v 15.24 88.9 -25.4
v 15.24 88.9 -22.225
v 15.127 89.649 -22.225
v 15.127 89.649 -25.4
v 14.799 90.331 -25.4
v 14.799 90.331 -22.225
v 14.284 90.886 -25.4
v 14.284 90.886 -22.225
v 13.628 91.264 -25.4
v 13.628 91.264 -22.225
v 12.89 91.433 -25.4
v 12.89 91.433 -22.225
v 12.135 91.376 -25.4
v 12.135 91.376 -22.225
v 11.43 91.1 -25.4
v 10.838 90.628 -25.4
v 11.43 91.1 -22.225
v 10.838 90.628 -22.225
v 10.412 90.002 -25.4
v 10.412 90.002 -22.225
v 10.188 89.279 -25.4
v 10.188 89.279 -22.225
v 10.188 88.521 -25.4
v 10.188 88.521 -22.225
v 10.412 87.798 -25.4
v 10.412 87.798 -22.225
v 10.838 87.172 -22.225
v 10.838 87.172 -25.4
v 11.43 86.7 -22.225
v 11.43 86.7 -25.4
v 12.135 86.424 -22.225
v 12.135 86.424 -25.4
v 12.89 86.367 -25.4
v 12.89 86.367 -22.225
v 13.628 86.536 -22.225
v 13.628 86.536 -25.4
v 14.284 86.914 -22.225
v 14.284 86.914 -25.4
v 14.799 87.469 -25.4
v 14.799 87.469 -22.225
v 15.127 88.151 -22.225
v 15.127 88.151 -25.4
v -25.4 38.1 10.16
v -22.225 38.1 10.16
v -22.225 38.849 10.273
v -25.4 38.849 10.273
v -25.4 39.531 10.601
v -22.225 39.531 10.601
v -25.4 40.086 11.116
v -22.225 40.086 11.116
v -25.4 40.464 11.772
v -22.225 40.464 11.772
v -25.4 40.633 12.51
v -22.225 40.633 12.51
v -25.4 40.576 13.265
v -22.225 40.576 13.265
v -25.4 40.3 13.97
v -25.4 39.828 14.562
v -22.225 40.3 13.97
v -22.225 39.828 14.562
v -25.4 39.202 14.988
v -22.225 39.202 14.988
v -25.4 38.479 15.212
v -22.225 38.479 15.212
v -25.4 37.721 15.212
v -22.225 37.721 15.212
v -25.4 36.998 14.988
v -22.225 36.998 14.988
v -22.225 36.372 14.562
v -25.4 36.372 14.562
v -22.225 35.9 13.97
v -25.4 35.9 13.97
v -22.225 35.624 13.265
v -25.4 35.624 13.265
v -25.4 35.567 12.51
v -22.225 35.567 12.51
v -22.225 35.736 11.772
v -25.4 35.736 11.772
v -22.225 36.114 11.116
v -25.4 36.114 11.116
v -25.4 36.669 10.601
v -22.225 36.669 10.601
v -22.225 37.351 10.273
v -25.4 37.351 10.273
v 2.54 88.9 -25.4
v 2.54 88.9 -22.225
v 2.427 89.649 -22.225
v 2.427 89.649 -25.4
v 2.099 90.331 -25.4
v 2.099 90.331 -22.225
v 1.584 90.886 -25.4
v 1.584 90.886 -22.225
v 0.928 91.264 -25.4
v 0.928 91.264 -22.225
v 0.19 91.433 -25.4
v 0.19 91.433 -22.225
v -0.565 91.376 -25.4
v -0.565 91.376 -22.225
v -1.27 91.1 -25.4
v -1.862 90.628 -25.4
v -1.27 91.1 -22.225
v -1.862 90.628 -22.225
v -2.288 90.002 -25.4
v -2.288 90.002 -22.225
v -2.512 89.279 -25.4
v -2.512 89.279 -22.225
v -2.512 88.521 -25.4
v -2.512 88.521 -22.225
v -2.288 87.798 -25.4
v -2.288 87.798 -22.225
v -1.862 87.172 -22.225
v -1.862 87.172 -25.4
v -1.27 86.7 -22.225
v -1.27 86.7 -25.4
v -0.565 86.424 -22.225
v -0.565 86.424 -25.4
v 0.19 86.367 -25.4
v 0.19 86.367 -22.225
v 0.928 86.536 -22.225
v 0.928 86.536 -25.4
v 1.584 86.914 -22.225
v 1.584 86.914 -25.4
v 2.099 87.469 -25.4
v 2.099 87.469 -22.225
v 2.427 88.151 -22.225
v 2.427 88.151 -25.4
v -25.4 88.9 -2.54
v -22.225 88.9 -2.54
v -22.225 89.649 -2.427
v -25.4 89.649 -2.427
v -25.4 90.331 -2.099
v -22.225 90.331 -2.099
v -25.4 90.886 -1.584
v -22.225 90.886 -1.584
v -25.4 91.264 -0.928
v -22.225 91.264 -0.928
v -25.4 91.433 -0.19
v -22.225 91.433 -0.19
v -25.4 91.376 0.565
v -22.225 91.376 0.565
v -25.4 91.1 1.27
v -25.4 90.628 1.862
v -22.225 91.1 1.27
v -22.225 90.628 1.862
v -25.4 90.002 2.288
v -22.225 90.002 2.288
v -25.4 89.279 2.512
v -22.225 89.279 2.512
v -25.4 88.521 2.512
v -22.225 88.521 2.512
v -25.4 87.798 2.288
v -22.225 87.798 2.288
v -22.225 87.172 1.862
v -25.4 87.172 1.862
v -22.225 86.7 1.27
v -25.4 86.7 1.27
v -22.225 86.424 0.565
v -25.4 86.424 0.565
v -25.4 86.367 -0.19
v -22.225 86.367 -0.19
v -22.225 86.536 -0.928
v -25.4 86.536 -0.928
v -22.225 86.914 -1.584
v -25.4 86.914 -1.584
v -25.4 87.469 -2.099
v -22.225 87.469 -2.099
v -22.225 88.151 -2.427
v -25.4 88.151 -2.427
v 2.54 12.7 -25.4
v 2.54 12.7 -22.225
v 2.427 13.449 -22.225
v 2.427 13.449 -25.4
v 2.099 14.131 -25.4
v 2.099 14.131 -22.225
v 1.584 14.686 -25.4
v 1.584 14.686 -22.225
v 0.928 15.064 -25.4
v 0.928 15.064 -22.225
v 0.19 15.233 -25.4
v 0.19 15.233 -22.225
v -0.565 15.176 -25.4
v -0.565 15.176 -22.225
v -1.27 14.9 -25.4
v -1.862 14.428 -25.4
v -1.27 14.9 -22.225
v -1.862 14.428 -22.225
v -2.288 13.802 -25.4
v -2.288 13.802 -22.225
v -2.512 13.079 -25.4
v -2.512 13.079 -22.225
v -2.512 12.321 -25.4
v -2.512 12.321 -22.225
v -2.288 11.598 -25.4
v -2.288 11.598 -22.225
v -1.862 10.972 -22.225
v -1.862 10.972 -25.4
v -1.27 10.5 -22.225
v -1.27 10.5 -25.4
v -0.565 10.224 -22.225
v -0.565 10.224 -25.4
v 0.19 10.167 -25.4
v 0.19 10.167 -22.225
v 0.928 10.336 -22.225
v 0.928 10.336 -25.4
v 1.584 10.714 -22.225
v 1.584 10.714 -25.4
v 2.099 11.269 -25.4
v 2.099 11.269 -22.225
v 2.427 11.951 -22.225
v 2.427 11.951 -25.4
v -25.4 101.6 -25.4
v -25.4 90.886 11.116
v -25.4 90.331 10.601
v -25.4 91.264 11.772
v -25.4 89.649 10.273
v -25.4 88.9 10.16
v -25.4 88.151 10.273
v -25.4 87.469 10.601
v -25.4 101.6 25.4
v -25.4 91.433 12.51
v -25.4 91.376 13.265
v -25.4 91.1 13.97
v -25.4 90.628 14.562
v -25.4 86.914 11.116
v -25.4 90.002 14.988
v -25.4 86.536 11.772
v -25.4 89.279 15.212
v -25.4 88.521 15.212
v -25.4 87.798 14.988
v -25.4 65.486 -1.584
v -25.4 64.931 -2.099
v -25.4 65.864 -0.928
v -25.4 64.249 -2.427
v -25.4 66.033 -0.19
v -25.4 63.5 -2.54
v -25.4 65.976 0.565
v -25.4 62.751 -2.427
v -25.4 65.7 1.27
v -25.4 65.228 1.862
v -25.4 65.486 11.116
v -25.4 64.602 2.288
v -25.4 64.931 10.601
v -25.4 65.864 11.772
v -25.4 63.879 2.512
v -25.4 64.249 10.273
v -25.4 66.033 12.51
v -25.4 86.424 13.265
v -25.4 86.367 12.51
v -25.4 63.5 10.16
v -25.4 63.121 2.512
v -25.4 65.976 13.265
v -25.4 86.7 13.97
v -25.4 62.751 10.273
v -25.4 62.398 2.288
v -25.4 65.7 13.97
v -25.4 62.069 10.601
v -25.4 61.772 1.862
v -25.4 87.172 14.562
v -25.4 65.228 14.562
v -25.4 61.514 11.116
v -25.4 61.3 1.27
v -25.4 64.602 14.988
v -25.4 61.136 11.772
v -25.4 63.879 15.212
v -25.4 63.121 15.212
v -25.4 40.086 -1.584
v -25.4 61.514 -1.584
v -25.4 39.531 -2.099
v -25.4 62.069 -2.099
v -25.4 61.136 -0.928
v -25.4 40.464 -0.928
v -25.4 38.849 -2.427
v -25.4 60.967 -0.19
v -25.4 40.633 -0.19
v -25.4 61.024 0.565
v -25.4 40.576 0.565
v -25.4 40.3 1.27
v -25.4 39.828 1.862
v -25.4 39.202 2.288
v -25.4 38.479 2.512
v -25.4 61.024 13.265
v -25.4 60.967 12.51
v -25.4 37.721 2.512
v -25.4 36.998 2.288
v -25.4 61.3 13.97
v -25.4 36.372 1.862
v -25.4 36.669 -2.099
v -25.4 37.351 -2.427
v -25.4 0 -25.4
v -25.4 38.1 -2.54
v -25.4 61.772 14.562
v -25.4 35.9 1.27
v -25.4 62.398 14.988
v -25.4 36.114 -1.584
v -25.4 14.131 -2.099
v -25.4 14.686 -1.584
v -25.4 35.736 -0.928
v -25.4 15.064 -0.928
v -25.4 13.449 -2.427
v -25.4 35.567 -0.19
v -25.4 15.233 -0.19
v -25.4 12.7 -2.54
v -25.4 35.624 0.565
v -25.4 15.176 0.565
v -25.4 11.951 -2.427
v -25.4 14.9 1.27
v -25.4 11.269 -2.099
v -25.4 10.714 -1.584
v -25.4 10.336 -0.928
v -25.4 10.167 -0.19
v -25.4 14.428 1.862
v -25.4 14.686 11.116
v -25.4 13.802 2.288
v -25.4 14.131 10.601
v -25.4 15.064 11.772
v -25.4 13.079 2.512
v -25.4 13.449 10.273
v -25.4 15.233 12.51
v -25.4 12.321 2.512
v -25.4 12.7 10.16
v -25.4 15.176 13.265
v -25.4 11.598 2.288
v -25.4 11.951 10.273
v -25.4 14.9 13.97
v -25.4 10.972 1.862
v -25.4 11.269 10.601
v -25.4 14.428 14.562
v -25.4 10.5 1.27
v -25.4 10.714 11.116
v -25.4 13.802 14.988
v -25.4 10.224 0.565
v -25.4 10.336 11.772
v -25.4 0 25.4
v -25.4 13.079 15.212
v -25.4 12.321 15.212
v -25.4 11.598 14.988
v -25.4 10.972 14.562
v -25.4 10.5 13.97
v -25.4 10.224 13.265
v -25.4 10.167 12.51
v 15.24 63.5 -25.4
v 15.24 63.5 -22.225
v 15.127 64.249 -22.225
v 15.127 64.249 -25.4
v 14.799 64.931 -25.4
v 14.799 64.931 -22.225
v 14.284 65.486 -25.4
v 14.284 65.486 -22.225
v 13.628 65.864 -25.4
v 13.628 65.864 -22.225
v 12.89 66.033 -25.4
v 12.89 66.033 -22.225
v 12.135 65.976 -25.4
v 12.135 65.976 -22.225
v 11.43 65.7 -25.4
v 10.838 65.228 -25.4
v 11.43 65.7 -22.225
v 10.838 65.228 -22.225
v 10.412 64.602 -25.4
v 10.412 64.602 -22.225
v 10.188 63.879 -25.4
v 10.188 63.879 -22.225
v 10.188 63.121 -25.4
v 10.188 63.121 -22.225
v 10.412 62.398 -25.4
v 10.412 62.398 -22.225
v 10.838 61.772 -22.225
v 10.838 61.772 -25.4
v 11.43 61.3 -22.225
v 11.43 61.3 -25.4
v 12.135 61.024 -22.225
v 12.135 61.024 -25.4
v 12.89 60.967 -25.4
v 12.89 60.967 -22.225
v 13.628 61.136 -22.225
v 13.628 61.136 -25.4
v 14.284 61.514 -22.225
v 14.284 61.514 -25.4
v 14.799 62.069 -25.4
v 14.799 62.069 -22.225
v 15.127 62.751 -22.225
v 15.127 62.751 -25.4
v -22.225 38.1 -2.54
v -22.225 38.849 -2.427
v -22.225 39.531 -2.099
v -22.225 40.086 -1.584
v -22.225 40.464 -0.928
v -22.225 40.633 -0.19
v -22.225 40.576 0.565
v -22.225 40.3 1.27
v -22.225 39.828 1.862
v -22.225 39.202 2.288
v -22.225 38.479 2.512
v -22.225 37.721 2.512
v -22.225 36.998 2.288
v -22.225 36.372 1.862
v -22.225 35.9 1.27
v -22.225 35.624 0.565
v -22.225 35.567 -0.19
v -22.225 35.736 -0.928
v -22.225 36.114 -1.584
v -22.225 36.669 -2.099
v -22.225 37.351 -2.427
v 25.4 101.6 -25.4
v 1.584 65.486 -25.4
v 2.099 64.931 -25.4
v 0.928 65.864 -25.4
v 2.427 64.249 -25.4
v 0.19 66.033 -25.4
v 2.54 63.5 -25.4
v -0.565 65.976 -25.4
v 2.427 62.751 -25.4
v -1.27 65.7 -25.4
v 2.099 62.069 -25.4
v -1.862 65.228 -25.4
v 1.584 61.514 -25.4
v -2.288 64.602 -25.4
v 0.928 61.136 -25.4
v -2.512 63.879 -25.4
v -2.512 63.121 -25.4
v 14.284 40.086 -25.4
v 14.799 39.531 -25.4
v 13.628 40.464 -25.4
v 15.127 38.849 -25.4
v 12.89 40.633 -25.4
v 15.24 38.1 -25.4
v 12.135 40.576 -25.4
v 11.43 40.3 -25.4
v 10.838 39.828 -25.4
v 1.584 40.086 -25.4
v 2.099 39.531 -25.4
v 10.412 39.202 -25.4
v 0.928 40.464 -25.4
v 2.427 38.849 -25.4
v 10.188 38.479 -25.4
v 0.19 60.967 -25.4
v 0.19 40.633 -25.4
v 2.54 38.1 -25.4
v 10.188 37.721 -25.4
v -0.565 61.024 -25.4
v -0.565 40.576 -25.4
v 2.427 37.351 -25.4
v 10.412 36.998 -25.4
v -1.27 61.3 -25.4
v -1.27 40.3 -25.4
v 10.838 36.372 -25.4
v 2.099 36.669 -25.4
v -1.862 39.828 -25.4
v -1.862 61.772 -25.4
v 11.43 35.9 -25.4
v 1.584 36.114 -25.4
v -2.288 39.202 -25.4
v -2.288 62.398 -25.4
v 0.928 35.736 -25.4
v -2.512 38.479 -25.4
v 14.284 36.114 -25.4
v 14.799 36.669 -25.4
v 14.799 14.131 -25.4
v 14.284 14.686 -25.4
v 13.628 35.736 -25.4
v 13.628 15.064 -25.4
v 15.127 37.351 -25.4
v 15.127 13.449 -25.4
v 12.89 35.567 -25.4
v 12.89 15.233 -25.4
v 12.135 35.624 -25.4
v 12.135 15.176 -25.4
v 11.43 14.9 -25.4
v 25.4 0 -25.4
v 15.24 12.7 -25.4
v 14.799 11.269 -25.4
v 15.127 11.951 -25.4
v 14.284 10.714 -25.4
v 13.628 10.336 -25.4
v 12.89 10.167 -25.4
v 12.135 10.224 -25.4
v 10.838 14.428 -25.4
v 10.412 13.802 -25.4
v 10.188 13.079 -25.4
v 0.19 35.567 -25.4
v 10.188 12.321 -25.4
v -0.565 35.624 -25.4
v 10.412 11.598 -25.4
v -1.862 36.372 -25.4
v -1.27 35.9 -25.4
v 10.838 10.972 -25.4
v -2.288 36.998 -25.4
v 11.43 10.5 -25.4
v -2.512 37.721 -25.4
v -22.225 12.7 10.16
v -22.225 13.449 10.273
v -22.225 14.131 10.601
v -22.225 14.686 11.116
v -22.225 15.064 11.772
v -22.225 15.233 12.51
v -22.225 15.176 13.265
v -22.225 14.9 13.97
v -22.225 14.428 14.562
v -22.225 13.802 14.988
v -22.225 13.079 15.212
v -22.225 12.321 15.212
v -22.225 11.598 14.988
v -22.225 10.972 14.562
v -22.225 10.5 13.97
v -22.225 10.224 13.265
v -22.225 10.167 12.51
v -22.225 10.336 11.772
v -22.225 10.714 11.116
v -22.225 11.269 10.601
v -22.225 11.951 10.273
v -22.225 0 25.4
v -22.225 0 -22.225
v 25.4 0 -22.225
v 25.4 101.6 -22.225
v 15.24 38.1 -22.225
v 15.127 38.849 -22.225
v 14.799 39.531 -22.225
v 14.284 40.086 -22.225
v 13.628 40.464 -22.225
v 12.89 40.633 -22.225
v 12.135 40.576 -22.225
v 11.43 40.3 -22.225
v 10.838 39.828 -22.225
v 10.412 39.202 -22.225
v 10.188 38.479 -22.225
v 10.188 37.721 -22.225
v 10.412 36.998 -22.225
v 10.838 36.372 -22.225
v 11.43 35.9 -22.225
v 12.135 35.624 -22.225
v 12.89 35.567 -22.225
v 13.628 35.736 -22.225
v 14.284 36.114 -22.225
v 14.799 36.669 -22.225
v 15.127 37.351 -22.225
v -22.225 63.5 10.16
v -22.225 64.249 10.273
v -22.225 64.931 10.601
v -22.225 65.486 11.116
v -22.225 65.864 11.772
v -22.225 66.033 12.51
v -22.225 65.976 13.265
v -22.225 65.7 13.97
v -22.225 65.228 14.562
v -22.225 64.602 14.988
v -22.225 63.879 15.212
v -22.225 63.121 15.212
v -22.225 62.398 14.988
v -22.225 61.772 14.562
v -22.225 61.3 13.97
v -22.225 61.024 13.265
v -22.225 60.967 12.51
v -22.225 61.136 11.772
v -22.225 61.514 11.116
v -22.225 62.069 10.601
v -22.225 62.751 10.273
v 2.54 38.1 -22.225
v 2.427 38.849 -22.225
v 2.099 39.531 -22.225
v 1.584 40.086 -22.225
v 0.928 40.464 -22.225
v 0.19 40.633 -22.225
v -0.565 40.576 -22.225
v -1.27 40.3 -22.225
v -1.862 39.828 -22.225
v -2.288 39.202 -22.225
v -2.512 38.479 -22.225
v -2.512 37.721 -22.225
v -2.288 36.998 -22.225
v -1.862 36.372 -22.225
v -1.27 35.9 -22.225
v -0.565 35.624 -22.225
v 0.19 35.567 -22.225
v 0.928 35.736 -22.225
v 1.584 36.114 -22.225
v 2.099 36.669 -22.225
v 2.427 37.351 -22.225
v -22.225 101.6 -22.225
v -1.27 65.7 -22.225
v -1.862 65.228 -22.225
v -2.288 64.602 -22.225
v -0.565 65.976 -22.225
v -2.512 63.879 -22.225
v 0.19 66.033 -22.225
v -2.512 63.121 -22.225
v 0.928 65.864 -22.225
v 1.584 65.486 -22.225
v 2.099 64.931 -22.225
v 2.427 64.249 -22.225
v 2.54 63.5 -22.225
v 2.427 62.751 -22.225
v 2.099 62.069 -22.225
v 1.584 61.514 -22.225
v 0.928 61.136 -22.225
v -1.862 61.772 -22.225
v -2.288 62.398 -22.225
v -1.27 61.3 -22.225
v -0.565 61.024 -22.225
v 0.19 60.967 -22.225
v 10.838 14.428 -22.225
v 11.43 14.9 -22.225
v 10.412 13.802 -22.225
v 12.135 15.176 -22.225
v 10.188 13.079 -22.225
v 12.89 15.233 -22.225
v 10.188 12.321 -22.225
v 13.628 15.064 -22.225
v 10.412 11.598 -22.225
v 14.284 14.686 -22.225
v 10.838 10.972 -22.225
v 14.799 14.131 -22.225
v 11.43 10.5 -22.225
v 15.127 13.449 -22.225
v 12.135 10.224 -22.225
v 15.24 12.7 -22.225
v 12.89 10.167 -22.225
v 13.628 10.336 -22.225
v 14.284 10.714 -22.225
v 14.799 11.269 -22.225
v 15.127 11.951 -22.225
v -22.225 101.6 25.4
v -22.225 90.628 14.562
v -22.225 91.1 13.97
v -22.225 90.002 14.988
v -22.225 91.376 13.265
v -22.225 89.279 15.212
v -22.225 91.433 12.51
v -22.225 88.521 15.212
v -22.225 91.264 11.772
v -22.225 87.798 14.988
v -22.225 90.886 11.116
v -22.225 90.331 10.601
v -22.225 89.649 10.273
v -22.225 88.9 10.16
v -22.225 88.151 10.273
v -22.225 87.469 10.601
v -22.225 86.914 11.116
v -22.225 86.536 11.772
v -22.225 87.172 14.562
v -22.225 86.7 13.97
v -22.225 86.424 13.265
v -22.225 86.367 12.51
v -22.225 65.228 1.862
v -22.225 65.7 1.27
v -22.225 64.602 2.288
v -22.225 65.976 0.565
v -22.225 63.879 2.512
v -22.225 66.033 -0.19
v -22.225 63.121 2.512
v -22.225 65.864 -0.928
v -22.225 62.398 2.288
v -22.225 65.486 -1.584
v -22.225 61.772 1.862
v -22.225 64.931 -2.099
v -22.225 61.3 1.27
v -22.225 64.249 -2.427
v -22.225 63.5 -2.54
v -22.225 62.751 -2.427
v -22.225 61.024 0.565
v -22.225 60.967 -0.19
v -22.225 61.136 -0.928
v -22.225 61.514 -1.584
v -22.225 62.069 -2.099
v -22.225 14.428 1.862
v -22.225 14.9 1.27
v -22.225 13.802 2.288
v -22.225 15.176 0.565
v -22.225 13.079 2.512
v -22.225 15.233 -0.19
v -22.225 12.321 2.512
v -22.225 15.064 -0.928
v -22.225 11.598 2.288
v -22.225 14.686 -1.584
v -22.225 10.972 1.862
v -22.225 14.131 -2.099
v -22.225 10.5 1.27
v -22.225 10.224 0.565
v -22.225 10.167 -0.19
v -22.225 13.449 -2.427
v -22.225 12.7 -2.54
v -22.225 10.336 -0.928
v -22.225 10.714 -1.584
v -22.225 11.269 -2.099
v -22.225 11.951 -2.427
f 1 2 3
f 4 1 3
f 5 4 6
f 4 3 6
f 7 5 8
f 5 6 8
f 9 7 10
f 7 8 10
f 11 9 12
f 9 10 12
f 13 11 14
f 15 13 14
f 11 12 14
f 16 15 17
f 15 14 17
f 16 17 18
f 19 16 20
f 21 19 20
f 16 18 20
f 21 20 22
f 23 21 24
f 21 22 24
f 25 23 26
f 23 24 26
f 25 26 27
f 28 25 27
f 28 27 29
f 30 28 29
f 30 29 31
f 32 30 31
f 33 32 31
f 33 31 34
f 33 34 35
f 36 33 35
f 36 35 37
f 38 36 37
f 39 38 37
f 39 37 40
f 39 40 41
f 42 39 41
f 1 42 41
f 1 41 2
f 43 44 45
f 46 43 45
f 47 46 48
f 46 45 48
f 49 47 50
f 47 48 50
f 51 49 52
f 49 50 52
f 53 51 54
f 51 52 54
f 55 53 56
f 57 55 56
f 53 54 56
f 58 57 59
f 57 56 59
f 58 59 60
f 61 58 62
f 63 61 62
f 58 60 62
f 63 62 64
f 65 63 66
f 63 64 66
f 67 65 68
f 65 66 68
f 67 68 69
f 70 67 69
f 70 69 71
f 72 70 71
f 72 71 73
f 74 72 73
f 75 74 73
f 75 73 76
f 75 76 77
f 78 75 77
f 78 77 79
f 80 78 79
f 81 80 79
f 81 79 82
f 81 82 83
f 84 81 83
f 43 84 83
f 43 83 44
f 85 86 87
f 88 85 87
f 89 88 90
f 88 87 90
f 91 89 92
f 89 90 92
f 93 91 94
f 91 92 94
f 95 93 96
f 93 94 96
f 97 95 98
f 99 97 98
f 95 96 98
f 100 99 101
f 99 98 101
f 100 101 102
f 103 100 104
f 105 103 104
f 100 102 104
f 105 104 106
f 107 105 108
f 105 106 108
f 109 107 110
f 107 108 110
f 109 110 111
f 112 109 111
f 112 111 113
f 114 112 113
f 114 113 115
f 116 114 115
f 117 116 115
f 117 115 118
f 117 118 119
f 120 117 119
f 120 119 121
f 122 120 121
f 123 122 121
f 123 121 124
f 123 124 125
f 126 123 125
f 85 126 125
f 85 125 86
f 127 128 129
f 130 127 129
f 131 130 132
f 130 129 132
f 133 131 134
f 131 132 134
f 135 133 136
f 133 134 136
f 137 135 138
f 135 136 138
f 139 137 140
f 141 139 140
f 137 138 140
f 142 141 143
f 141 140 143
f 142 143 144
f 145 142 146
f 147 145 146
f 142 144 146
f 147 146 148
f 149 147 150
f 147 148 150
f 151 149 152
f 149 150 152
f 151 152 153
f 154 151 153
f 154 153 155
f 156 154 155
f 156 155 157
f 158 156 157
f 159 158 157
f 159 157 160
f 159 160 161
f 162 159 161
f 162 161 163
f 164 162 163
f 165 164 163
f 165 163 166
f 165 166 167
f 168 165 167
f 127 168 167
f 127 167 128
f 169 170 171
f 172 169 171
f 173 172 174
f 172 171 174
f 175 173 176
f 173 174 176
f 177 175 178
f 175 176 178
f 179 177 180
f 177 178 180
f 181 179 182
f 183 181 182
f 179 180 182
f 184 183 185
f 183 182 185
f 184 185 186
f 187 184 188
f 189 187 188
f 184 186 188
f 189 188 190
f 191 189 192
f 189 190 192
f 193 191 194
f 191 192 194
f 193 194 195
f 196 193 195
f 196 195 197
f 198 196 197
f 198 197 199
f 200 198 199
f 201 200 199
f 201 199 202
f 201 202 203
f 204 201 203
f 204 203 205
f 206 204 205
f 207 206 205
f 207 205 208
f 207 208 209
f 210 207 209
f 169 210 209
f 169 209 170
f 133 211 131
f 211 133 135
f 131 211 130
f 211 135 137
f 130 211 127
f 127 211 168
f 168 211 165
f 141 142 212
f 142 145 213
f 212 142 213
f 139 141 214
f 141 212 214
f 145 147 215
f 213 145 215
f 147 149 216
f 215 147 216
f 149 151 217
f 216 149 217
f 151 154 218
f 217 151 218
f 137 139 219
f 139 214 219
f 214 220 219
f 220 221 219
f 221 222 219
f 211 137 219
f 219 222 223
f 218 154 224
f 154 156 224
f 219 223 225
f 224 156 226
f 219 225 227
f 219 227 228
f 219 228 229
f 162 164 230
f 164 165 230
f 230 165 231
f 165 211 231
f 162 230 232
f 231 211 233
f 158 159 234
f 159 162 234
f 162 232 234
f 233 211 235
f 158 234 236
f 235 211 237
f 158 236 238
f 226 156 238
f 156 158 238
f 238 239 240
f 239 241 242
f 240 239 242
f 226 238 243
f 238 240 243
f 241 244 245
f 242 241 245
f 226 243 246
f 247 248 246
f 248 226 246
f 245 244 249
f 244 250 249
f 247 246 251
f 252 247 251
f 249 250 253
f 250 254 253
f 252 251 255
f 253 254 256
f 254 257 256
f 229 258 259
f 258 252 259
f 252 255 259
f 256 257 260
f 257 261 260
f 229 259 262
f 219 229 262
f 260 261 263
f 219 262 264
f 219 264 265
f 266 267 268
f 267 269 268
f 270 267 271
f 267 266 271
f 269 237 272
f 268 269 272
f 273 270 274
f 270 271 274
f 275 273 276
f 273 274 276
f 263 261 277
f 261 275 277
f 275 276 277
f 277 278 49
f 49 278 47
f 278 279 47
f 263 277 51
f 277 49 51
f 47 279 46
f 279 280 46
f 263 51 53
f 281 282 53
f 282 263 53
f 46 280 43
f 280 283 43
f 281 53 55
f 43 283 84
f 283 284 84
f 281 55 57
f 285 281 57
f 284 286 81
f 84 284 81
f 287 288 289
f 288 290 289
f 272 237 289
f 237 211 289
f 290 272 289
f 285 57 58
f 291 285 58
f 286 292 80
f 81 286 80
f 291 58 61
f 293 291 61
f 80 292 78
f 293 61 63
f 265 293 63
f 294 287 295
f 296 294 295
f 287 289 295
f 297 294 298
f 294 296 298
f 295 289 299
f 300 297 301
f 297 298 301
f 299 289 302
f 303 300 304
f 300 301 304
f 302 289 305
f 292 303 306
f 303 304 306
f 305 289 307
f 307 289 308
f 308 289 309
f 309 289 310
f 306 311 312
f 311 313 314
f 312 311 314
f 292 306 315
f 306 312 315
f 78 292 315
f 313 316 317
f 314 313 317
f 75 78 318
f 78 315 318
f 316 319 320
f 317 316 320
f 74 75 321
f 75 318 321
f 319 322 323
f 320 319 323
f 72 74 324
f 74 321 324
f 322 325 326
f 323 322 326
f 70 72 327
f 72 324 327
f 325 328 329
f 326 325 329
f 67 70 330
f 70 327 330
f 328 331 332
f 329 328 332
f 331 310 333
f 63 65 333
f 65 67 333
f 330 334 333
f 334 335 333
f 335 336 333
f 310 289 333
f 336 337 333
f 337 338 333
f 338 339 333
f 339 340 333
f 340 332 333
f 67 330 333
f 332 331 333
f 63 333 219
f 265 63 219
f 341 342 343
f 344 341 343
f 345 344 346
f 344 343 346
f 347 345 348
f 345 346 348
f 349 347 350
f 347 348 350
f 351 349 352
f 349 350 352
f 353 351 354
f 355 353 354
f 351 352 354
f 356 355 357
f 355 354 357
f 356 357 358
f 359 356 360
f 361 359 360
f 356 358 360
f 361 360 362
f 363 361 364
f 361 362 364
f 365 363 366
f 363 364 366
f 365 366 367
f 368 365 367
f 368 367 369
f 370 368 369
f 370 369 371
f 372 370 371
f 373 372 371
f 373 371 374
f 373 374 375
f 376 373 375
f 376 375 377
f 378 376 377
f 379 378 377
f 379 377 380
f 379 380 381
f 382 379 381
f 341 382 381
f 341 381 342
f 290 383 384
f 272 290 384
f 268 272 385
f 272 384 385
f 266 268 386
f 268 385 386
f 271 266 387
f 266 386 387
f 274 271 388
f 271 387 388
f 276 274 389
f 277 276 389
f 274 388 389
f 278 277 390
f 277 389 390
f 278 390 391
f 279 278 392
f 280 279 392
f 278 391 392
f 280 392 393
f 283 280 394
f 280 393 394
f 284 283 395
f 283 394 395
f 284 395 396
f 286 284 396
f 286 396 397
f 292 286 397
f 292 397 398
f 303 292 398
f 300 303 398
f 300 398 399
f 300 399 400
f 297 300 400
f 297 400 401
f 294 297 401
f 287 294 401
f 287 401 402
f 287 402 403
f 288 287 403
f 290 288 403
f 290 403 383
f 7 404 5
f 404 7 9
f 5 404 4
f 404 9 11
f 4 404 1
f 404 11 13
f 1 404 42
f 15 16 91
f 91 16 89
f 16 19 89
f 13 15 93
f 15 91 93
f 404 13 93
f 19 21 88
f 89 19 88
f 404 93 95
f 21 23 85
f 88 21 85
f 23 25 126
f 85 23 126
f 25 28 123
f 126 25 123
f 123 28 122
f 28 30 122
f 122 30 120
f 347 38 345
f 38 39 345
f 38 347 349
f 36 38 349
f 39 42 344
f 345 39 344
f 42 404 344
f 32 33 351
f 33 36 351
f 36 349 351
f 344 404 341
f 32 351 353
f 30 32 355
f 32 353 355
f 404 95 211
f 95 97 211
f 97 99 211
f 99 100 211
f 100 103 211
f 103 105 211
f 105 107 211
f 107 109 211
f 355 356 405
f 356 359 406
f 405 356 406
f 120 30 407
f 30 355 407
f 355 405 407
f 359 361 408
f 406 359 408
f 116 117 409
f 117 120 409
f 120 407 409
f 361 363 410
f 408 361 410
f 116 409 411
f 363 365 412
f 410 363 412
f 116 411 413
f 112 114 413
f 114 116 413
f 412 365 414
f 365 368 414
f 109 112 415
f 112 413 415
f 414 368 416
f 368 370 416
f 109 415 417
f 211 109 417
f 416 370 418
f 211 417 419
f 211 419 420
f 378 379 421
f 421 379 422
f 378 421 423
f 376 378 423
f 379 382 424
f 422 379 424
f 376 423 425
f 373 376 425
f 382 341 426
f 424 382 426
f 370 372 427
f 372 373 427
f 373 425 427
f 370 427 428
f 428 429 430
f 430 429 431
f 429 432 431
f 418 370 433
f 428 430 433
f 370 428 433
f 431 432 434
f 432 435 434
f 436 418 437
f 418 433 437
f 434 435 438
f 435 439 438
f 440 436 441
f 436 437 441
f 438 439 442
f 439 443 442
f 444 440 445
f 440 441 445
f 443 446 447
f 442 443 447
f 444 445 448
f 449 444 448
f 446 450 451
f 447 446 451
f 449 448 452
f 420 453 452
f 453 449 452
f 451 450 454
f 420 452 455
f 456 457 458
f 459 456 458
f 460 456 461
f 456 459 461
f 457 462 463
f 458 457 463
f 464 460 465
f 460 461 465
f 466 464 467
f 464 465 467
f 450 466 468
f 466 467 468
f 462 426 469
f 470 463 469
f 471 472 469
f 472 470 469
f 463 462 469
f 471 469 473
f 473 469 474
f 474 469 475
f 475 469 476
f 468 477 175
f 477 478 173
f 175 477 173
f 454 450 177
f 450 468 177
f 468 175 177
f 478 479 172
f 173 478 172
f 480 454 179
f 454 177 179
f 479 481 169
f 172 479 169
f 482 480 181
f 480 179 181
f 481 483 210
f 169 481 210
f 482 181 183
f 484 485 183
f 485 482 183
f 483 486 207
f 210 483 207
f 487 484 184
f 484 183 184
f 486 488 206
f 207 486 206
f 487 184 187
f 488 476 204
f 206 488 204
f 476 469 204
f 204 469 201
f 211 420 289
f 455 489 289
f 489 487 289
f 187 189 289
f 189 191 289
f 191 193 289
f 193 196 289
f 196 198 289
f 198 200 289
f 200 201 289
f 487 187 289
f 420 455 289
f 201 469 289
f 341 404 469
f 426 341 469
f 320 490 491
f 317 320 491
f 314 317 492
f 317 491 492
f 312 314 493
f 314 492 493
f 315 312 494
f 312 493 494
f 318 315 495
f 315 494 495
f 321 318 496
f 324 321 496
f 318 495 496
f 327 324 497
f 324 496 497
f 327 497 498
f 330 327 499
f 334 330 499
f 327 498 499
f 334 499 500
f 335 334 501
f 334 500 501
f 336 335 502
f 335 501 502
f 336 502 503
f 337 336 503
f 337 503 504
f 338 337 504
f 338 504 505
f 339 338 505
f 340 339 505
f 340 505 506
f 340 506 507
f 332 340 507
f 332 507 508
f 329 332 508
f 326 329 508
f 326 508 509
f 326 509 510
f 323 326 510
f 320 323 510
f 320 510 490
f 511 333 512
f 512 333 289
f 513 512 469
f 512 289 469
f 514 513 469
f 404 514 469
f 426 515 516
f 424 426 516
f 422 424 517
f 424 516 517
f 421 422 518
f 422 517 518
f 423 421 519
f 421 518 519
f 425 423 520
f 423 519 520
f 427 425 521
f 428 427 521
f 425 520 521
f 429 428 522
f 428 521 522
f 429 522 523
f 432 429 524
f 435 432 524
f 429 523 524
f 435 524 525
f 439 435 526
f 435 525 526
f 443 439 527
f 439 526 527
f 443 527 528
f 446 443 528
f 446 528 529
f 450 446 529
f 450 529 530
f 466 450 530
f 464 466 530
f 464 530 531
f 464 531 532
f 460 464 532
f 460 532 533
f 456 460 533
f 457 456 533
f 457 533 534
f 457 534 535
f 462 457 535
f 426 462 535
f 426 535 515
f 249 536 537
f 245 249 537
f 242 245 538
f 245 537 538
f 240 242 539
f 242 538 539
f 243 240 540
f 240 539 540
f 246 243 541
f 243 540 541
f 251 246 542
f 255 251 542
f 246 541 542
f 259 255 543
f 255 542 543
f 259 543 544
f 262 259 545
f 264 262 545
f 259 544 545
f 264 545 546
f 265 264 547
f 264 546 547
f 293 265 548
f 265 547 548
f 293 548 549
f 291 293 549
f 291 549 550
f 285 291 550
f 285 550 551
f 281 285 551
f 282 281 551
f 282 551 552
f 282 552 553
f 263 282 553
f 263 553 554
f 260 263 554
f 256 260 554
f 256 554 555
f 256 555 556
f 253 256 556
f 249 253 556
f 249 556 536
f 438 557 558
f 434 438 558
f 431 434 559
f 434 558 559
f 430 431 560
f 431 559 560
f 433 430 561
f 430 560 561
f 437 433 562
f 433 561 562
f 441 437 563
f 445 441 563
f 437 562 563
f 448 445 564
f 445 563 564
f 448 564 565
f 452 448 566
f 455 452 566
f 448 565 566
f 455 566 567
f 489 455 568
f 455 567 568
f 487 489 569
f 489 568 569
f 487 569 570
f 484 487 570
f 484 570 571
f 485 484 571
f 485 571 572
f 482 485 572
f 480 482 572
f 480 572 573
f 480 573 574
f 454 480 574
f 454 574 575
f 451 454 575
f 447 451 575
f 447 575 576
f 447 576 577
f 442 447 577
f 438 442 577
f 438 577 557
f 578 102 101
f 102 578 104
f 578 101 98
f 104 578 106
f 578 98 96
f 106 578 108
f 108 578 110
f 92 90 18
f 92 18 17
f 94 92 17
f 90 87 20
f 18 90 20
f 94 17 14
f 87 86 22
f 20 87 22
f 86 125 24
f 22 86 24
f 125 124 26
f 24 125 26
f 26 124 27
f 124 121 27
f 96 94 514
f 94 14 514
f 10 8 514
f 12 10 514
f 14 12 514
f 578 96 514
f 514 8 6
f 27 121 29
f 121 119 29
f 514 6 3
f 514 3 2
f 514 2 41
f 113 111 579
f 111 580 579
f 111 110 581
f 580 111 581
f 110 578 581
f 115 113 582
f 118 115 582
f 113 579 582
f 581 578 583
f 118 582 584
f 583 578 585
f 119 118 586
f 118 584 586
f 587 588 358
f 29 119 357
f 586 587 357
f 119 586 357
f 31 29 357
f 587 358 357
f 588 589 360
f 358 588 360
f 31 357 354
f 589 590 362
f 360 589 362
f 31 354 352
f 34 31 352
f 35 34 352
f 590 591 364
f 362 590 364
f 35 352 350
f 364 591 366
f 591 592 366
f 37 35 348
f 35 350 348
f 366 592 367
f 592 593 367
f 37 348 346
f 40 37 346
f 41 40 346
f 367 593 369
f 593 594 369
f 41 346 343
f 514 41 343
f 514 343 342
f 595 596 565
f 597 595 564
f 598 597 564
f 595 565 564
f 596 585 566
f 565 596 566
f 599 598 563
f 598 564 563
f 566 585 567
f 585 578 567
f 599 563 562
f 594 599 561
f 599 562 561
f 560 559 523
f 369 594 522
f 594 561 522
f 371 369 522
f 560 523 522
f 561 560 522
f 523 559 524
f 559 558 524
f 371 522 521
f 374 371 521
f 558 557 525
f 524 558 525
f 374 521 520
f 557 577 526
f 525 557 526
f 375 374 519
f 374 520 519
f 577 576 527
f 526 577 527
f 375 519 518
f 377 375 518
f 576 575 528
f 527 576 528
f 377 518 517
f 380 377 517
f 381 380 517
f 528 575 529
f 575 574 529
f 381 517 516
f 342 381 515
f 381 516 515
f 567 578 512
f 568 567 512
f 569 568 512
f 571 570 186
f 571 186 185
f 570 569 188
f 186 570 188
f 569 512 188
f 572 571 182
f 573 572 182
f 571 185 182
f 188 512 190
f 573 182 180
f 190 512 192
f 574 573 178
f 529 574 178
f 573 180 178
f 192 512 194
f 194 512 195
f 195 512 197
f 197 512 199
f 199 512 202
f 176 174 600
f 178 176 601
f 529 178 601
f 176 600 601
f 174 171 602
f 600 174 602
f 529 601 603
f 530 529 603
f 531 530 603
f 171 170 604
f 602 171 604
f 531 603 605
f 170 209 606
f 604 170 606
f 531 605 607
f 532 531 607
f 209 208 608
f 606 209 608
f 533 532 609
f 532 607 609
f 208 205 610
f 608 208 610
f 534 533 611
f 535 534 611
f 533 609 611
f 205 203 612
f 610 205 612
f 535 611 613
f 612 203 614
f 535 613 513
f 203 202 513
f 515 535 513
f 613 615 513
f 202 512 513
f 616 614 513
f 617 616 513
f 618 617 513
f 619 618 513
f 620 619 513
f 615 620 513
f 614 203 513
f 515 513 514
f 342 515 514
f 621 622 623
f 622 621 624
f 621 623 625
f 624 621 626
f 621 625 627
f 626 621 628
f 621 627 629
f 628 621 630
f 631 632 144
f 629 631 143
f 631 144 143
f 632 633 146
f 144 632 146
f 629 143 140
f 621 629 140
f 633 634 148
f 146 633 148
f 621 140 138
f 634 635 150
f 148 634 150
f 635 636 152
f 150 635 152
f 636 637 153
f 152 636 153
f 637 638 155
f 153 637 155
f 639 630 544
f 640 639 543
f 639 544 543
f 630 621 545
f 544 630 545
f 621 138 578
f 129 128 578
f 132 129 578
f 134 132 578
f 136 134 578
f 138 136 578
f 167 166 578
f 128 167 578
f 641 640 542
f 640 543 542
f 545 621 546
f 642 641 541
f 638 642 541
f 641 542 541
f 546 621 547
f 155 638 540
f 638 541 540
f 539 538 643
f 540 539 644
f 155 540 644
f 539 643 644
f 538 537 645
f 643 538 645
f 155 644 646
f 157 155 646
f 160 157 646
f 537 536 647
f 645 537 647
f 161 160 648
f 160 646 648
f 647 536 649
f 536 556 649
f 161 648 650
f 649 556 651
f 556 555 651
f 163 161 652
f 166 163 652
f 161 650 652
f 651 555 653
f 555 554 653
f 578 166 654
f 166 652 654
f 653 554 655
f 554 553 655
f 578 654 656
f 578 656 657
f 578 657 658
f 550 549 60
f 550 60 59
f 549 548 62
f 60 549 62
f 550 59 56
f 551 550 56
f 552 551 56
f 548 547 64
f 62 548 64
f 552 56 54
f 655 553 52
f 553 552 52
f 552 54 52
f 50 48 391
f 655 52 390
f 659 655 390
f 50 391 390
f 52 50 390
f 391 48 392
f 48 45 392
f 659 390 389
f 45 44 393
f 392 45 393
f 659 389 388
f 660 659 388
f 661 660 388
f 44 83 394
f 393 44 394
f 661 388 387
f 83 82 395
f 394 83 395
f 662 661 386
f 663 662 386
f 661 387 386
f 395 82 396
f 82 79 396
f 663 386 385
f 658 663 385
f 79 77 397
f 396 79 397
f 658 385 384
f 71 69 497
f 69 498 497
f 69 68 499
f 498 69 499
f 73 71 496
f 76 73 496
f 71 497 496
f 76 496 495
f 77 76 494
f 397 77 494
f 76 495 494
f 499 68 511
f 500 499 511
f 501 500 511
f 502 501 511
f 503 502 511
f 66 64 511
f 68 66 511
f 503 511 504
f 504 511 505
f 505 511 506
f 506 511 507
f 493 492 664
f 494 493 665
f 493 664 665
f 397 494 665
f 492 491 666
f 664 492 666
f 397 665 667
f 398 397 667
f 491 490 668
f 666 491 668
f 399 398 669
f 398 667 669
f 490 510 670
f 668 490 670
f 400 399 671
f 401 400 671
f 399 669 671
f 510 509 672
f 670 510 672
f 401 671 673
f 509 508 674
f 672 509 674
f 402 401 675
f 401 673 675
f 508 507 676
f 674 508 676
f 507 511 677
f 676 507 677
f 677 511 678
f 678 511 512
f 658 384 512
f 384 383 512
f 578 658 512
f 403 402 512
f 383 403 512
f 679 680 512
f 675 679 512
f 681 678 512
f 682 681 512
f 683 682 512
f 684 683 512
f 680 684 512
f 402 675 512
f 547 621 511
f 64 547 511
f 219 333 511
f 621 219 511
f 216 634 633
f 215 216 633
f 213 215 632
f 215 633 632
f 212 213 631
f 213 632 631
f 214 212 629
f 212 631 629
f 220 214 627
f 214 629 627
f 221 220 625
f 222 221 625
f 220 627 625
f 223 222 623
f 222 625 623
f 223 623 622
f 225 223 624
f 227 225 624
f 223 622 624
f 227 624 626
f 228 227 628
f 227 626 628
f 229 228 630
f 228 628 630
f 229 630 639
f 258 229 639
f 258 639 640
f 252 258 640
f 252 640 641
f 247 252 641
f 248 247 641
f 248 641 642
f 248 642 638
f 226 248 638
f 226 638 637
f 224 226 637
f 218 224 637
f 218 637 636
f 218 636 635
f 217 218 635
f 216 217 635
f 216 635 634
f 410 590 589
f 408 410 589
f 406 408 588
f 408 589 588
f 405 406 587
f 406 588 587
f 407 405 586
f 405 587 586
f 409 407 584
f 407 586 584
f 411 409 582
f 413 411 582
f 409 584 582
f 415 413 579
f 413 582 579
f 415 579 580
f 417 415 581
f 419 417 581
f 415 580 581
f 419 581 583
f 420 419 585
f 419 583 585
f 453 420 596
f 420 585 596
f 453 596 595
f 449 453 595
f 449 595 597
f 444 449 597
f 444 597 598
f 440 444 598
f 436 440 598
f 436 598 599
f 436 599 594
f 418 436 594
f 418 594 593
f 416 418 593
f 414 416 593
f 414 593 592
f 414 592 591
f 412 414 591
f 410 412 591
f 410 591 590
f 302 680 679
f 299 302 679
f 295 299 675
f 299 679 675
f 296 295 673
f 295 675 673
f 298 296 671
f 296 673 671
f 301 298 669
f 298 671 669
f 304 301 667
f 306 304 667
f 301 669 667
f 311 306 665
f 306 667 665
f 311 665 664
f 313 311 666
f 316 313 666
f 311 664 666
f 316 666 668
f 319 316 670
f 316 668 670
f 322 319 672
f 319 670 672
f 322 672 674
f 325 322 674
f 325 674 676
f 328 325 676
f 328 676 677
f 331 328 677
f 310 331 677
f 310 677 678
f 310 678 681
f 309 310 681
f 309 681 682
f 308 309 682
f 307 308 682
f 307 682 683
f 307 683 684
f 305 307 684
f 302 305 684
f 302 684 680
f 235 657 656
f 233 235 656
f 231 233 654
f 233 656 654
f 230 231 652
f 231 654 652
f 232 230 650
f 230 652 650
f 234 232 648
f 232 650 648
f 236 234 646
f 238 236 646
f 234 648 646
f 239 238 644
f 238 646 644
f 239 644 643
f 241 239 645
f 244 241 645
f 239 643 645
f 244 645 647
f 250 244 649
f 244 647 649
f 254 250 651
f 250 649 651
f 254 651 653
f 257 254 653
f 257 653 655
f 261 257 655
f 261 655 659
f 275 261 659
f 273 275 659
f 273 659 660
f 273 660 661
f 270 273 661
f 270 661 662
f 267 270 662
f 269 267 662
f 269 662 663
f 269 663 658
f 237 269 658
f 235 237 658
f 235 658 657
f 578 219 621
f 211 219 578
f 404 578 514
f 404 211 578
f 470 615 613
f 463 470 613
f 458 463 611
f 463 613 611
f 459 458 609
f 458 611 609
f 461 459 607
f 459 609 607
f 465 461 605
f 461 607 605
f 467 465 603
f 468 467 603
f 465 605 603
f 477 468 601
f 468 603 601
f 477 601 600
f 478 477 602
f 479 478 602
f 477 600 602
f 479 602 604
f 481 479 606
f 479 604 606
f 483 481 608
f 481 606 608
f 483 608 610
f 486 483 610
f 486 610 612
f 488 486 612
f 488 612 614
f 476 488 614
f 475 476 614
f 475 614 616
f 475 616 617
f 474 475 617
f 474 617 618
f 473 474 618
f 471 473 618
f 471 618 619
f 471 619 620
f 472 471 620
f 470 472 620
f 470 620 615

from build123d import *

# Parameters (mm, degrees)
BOSS_EXTRUDE1_DEPTH = 101.6
SKETCH3_R           = 2.54
CUT_EXTRUDE1_DEPTH  = 4.175
SKETCH4_R           = 2.54
CUT_EXTRUDE2_DEPTH  = 4.175


with BuildPart() as part:
    # Sketch2 → Boss-Extrude1 (new body)
    with BuildSketch(Plane(origin=(0, 0, 0), x_dir=(1, 0, 0), z_dir=(0, 1, 0))):
        Polygon((-25.4, 25.4), (-25.4, -25.4), (-22.225, -25.4), (-22.225, 22.225), (25.4, 22.225), (25.4, 25.4), align=None)
    extrude(amount=BOSS_EXTRUDE1_DEPTH)

    # Sketch3 → Cut-Extrude1 (cut, through all)
    with BuildSketch(Plane.XY.offset(-22.225)):
        with Locations((12.7, 88.9)):
            Circle(SKETCH3_R)
        with Locations((0, 88.9)):
            Circle(SKETCH3_R)
        with Locations((0, 63.5)):
            Circle(SKETCH3_R)
        with Locations((12.7, 63.5)):
            Circle(SKETCH3_R)
        with Locations((0, 38.1)):
            Circle(SKETCH3_R)
        with Locations((12.7, 38.1)):
            Circle(SKETCH3_R)
        with Locations((0, 12.7)):
            Circle(SKETCH3_R)
        with Locations((12.7, 12.7)):
            Circle(SKETCH3_R)
    extrude(amount=-CUT_EXTRUDE1_DEPTH, mode=Mode.SUBTRACT)

    # Sketch4 → Cut-Extrude2 (cut, through all)
    with BuildSketch(Plane(origin=(-22.225, 0, 0), x_dir=(0, 0, -1), z_dir=(1, 0, 0))):
        with Locations((-12.7, 88.9)):
            Circle(SKETCH4_R)
        with Locations((0, 88.9)):
            Circle(SKETCH4_R)
        with Locations((-12.7, 63.5)):
            Circle(SKETCH4_R)
        with Locations((0, 63.5)):
            Circle(SKETCH4_R)
        with Locations((-12.7, 38.1)):
            Circle(SKETCH4_R)
        with Locations((0, 38.1)):
            Circle(SKETCH4_R)
        with Locations((-12.7, 12.7)):
            Circle(SKETCH4_R)
        with Locations((0, 12.7)):
            Circle(SKETCH4_R)
    extrude(amount=-CUT_EXTRUDE2_DEPTH, mode=Mode.SUBTRACT)


solid = part.part
